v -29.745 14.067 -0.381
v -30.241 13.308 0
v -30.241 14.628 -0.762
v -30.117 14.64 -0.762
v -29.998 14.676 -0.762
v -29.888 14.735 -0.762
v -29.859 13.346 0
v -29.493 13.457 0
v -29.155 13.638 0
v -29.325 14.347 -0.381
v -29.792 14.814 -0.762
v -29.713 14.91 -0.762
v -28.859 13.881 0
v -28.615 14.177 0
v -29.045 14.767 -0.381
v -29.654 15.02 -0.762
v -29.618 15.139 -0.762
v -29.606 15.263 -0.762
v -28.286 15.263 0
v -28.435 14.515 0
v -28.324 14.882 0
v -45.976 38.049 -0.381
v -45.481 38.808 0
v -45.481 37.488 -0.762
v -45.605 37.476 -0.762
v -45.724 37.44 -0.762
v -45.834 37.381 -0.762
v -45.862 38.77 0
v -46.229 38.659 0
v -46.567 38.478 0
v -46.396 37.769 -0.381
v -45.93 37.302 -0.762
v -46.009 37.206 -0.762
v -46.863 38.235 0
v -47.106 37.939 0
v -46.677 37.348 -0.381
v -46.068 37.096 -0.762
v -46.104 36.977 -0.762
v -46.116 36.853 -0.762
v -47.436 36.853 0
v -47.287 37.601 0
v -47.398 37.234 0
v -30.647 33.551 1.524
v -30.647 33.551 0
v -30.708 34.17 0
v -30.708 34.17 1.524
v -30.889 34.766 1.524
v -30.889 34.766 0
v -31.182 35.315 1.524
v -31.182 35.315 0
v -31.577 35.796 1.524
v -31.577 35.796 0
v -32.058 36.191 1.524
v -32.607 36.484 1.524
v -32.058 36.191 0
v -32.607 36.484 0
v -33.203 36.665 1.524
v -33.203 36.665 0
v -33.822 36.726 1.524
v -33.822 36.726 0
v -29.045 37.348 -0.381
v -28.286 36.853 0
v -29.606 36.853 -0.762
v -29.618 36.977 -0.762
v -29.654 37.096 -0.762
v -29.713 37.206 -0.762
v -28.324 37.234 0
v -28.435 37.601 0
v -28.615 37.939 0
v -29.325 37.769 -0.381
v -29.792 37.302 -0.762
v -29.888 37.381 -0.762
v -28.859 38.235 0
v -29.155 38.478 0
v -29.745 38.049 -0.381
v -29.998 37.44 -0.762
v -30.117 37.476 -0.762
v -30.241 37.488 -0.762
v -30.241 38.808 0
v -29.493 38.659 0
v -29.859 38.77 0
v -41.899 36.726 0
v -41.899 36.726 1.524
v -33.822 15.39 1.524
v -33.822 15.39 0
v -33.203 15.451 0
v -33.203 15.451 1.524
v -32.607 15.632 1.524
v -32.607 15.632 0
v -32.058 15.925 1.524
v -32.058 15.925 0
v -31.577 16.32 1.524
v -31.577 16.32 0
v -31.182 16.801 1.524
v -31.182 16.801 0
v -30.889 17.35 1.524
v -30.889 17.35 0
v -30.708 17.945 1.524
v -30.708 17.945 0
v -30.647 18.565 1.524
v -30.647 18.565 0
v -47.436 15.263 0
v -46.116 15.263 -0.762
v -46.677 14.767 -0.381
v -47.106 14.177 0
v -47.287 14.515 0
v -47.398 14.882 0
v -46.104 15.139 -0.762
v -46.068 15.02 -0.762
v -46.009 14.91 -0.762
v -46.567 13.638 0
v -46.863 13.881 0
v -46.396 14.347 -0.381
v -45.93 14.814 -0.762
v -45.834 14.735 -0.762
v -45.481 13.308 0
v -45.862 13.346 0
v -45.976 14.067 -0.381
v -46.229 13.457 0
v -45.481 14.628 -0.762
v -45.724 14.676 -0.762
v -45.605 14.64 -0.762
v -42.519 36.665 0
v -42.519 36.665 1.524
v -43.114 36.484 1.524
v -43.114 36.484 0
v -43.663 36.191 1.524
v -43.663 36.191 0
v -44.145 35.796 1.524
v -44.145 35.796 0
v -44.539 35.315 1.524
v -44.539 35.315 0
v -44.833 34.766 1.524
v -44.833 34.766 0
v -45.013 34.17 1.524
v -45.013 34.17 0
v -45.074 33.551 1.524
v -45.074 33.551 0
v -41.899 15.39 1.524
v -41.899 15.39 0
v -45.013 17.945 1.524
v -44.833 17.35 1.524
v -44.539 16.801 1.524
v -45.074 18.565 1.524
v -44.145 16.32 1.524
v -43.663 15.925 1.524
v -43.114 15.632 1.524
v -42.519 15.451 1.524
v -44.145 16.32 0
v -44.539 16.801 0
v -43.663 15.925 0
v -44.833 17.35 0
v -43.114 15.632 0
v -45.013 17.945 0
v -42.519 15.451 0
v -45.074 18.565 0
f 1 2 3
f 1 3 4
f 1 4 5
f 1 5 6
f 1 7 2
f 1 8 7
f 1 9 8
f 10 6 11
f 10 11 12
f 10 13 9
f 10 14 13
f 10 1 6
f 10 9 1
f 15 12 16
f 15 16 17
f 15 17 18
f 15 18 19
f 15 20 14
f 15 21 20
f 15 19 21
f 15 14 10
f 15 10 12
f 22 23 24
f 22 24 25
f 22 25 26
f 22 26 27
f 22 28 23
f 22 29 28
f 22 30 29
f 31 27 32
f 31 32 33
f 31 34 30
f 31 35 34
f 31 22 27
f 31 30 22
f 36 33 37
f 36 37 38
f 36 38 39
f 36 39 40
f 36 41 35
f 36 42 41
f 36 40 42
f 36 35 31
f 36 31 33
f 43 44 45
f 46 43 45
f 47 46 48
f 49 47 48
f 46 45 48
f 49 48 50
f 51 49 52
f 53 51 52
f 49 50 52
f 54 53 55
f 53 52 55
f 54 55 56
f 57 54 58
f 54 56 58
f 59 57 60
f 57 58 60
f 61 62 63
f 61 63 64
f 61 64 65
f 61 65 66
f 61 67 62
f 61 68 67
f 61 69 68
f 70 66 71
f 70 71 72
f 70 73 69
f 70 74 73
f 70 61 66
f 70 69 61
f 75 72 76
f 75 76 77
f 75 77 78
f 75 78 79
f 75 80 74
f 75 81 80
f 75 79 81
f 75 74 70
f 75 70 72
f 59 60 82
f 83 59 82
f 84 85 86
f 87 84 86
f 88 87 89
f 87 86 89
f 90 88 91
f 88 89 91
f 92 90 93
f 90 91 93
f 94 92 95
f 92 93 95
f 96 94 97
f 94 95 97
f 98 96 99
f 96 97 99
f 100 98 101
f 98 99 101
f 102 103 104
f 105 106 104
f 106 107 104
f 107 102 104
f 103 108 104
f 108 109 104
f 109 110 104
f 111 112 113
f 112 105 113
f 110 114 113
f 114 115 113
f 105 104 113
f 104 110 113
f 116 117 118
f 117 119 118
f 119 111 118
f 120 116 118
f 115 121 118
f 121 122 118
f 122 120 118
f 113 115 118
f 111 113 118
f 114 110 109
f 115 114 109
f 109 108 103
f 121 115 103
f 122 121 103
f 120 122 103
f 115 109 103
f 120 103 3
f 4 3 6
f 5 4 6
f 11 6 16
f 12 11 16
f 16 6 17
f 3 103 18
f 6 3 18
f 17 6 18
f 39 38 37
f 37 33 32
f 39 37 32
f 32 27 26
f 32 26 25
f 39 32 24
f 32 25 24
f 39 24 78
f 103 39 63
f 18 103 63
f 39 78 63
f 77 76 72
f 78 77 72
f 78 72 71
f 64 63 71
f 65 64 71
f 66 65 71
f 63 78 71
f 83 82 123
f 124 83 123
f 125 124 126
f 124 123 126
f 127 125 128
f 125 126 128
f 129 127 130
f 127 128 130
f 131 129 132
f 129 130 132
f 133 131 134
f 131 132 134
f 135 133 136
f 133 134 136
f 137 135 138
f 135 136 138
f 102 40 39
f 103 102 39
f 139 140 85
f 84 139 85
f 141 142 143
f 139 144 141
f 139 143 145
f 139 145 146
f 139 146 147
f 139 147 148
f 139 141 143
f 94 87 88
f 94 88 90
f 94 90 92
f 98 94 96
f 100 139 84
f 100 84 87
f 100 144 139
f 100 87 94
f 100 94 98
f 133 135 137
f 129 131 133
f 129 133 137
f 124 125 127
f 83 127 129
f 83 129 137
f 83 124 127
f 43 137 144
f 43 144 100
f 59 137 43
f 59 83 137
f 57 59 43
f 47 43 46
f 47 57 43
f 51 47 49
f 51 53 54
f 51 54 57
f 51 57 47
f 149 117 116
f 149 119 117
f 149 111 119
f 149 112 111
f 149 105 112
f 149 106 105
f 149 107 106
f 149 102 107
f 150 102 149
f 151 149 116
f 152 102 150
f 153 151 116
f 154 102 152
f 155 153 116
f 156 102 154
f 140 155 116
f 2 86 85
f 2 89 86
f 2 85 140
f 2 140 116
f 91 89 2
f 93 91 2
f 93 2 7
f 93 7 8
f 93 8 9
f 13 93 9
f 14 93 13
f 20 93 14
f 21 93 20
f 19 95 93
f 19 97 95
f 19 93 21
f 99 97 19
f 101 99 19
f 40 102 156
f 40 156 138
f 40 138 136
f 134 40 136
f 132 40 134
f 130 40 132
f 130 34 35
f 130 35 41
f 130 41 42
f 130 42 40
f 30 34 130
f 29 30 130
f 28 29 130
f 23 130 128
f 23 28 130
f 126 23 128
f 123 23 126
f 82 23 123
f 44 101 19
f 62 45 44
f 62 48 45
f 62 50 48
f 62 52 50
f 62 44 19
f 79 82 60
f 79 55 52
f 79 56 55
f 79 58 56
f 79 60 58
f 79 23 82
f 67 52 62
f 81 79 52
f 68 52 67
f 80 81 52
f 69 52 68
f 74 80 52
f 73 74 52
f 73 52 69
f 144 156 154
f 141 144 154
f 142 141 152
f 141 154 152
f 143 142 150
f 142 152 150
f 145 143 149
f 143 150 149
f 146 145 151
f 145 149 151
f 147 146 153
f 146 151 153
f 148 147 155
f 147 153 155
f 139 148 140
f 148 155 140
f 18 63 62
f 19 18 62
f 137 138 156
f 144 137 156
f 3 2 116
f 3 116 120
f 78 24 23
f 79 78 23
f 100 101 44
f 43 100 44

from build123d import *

# Parameters (mm, degrees)
F2_DEPTH     = 1.524
F3_DEPTH     = 0.762
F4_T1_DEPTH  = 21.59
F4_T3_DEPTH  = 15.24
F4_T6_ANGLE  = 90
F4_T8_ANGLE  = 90
F4_T10_ANGLE = 90
F4_T12_ANGLE = 90


# Not quite as in the source:
# - a fillet or chamfer that OpenCascade refuses, or shapes differently, is made with other operations: its cross-section is extruded or revolved along the edge and cut away or added


with BuildPart() as f2:
    # F1 (on face) → F2 (new body)
    with BuildSketch(Plane.XY):
        with BuildLine():
            ThreePointArc((-45.0744511747, 18.5649100114), (-44.144515205, 16.3198459811), (-41.8994511747, 15.3899100114))
            Line((-41.8994511747, 15.3899100114), (-33.8222511747, 15.3899100114))
            ThreePointArc((-33.8222511747, 15.3899100114), (-31.5771871445, 16.3198459811), (-30.6472511747, 18.5649100114))
            Line((-30.6472511747, 18.5649100114), (-30.6472511747, 33.5509100114))
            ThreePointArc((-30.6472511747, 33.5509100114), (-31.5771871445, 35.7959740417), (-33.8222511747, 36.7259100114))
            Line((-33.8222511747, 36.7259100114), (-41.8994511747, 36.7259100114))
            ThreePointArc((-41.8994511747, 36.7259100114), (-44.144515205, 35.7959740417), (-45.0744511747, 33.5509100114))
            Line((-45.0744511747, 33.5509100114), (-45.0744511747, 18.5649100114))
        make_face()
    extrude(amount=F2_DEPTH)

    # F0 (on Top) → F3 (join)
    with BuildSketch(Plane.XY):
        with BuildLine():
            ThreePointArc((-48.6558511747, 15.2629100114), (-47.725915205, 13.0178459811), (-45.4808511747, 12.0879100114))
            Line((-45.4808511747, 12.0879100114), (-30.2408511747, 12.0879100114))
            ThreePointArc((-30.2408511747, 12.0879100114), (-27.9957871445, 13.0178459811), (-27.0658511747, 15.2629100114))
            Line((-27.0658511747, 15.2629100114), (-27.0658511747, 36.8529100114))
            ThreePointArc((-27.0658511747, 36.8529100114), (-27.9957871445, 39.0979740417), (-30.2408511747, 40.0279100114))
            Line((-30.2408511747, 40.0279100114), (-45.4808511747, 40.0279100114))
            ThreePointArc((-45.4808511747, 40.0279100114), (-47.725915205, 39.0979740417), (-48.6558511747, 36.8529100114))
            Line((-48.6558511747, 36.8529100114), (-48.6558511747, 15.2629100114))
        make_face()
    extrude(amount=-F3_DEPTH)

    # F4: chamfer of 2.54 x 1.4664696837 on 8 edges, made by hand

    # F4_s2 → F4_t1 (cut)
    with BuildSketch(Plane.XZ.offset(-36.8529100114)):
        Polygon((-48.6558511747, 0.7044696837), (-46.1158511747, -0.762), (-48.6558511747, -0.762), align=None)
        Polygon((-29.6058511747, -0.762), (-27.0658511747, 0.7044696837), (-27.0658511747, -0.762), align=None)
    extrude(amount=F4_T1_DEPTH, mode=Mode.SUBTRACT)

    # F4_s4 → F4_t3 (cut)
    with BuildSketch(Plane.YZ.offset(-45.4808511747)):
        Polygon((37.4879100114, -0.762), (40.0279100114, 0.7044696837), (40.0279100114, -0.762), align=None)
        Polygon((12.0879100114, 0.7044696837), (14.6279100114, -0.762), (12.0879100114, -0.762), align=None)
    extrude(amount=F4_T3_DEPTH, mode=Mode.SUBTRACT)

    # F4_s5 → F4_t6 (revolve, cut)
    with BuildSketch(Plane.YZ.offset(-45.4808511747)):
        Polygon((37.4879100114, -0.762), (40.0279100114, 0.7044696837), (40.0279100114, -0.762), align=None)
    revolve(axis=Axis((-45.4808511747, 36.8529100114, -0.762), (0, 0, 1)), revolution_arc=F4_T6_ANGLE, mode=Mode.SUBTRACT)

    # F4_s7 → F4_t8 (revolve, cut)
    with BuildSketch(Plane.XZ.offset(-36.8529100114)):
        Polygon((-29.6058511747, -0.762), (-27.0658511747, 0.7044696837), (-27.0658511747, -0.762), align=None)
    revolve(axis=Axis((-30.2408511747, 36.8529100114, -0.762), (0, 0, 1)), revolution_arc=F4_T8_ANGLE, mode=Mode.SUBTRACT)

    # F4_s9 → F4_t10 (revolve, cut)
    with BuildSketch(Plane.YZ.offset(-30.2408511747)):
        Polygon((14.6279100114, -0.762), (12.0879100114, 0.7044696837), (12.0879100114, -0.762), align=None)
    revolve(axis=Axis((-30.2408511747, 15.2629100114, -0.762), (0, 0, 1)), revolution_arc=F4_T10_ANGLE, mode=Mode.SUBTRACT)

    # F4_s11 → F4_t12 (revolve, cut)
    with BuildSketch(Plane.XZ.offset(-15.2629100114)):
        Polygon((-48.6558511747, 0.7044696837), (-46.1158511747, -0.762), (-48.6558511747, -0.762), align=None)
    revolve(axis=Axis((-45.4808511747, 15.2629100114, -0.762), (0, 0, 1)), revolution_arc=F4_T12_ANGLE, mode=Mode.SUBTRACT)


solid = f2.part
